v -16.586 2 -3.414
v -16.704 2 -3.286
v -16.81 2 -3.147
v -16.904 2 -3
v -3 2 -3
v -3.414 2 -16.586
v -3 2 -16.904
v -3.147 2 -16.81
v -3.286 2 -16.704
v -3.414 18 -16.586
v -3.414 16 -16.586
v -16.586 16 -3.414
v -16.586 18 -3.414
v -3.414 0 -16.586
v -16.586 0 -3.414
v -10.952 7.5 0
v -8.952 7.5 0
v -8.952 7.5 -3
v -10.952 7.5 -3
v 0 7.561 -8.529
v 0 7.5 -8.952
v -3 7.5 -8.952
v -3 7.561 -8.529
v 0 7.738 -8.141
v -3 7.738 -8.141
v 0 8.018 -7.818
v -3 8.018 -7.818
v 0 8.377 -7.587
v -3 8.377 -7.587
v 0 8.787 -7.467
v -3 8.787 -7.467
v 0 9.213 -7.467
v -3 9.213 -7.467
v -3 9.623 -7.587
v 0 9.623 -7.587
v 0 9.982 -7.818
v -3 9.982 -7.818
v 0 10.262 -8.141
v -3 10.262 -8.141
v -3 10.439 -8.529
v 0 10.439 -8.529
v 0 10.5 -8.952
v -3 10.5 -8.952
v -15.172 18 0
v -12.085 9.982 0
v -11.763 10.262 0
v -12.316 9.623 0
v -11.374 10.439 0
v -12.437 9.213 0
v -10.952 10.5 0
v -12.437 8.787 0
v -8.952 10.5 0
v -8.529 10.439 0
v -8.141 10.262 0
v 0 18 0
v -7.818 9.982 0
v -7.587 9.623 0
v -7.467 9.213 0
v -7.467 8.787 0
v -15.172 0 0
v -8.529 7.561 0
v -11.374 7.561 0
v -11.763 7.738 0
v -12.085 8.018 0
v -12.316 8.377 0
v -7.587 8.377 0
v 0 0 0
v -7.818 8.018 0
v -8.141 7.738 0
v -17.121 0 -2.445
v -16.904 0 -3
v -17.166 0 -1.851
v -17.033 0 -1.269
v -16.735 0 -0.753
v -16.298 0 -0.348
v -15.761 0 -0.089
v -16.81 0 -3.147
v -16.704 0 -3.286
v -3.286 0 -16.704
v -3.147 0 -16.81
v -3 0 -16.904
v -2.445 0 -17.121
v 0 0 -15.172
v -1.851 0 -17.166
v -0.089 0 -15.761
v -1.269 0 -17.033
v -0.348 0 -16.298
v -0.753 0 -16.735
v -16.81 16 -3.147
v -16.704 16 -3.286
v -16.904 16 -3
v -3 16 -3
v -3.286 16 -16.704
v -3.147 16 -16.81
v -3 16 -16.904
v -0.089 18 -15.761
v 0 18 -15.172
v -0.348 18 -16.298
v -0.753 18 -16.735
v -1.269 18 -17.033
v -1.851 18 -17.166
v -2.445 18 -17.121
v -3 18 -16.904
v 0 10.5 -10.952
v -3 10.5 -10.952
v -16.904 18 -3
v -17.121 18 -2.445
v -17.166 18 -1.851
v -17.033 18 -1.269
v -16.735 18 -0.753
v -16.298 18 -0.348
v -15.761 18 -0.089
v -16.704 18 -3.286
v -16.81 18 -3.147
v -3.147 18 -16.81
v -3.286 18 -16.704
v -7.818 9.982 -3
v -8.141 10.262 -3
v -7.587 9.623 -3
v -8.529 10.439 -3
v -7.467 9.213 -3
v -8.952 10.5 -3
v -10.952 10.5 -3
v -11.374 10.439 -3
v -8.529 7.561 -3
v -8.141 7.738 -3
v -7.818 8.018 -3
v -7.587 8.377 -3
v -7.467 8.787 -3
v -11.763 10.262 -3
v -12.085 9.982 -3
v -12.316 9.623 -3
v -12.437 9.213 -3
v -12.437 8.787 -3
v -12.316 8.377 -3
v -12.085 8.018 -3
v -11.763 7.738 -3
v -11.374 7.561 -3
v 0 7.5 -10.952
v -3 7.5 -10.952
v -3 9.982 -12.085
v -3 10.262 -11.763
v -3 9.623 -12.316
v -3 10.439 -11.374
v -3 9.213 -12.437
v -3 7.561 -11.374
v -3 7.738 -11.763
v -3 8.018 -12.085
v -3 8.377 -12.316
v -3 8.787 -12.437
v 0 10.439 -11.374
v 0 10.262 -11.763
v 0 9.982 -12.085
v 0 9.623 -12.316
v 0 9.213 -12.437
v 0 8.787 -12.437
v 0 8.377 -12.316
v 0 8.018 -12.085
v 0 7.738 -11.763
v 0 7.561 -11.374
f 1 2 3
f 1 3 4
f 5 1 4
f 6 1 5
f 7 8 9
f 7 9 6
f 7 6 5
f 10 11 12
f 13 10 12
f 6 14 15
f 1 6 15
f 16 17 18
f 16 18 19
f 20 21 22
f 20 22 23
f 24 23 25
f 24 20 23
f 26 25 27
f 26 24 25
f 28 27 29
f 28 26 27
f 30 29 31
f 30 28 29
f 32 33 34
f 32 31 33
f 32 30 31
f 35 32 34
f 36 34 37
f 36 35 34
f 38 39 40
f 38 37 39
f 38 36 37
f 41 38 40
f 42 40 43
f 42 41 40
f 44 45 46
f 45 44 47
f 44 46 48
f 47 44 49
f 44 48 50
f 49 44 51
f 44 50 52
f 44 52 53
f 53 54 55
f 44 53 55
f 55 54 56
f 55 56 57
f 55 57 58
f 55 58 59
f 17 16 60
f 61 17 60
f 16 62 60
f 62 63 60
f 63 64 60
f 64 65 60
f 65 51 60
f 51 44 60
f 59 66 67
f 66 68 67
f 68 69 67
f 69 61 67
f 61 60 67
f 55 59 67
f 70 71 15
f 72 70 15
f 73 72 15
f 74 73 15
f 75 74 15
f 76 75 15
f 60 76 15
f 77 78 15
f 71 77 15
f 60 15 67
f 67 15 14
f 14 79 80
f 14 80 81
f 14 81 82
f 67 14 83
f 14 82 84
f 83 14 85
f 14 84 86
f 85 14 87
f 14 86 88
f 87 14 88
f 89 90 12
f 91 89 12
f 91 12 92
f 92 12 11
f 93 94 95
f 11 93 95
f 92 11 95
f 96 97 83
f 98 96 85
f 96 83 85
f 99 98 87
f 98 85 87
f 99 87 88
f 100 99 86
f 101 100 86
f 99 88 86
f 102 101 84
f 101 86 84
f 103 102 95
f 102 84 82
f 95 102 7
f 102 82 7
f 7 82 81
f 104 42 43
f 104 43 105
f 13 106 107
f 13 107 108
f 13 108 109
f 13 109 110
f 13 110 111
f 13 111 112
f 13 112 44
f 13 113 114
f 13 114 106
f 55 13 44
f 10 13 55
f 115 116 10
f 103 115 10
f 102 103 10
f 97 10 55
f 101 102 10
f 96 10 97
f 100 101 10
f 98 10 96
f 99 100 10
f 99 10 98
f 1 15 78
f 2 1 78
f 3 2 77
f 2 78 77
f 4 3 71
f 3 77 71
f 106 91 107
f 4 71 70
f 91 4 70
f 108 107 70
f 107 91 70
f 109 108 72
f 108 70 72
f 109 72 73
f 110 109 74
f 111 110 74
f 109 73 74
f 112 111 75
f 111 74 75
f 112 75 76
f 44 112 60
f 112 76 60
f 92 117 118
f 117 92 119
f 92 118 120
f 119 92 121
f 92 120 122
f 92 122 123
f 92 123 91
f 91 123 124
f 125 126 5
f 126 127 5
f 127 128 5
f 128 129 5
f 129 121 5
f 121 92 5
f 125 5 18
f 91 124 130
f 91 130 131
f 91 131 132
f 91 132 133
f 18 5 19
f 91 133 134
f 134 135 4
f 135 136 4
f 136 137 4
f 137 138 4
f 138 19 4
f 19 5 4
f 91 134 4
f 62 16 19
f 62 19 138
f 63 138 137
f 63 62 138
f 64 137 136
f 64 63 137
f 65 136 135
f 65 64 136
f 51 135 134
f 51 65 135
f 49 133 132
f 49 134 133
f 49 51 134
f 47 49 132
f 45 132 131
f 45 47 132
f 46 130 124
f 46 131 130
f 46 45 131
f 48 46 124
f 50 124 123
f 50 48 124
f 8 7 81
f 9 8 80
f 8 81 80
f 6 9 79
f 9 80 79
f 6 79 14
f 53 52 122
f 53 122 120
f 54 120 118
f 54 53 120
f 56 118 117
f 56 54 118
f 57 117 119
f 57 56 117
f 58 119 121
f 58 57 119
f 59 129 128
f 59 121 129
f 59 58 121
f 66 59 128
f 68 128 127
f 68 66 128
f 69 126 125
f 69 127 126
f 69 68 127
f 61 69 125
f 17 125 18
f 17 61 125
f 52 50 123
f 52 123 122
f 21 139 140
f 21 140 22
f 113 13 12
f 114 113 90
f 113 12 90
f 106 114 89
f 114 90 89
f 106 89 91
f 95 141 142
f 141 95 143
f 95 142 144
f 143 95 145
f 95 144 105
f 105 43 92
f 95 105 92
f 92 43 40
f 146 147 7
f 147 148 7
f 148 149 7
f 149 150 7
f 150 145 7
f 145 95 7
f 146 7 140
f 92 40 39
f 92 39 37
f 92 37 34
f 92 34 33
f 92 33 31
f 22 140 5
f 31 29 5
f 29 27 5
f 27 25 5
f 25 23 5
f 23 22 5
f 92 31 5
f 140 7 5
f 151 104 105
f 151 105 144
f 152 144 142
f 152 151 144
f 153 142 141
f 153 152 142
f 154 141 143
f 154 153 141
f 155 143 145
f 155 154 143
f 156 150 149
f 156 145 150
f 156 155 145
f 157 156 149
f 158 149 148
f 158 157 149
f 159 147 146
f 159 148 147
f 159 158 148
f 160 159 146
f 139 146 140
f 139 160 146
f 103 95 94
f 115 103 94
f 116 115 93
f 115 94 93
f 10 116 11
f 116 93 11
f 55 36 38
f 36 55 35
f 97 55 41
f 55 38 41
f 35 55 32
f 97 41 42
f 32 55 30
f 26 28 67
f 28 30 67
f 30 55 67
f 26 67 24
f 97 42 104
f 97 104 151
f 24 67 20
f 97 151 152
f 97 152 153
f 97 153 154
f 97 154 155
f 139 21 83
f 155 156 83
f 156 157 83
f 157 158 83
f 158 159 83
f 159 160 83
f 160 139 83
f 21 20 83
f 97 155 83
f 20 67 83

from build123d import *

# Parameters (mm, degrees)
DODANIE_WYCI_GNI_CIE1_DEPTH = 18
SKORUPA1_START              = 2
SKORUPA1_DEPTH              = 14
DODANIE_WYCI_GNI_CIE2_DEPTH = 18
WYTNIJ_WYCI_GNI_CIE1_REACH  = 32.228
WYTNIJ_WYCI_GNI_CIE2_REACH  = 32.228


# Read off the part's stored shape, not the designer's step: Skorupa1
with BuildPart() as part:
    # Szkic1 → Dodanie-wyciągnięcie1 (new body)
    with BuildSketch(Plane(origin=(0, 0, 0), x_dir=(1, 0, 0), z_dir=(0, 1, 0))):
        with BuildLine():
            Line((-15.171572875, 0), (0, 0))
            Line((0, 0), (0, 15.171572875))
            ThreePointArc((0, 15.171572875), (-1, 16.903623683), (-3, 16.903623683))
            Line((-3, 16.903623683), (-3, 3))
            Line((-3, 3), (-16.903623683, 3))
            ThreePointArc((-16.903623683, 3), (-16.903623683, 1), (-15.171572875, 0))
        make_face()
        with BuildLine():
            ThreePointArc((-16.585786438, 3.414213562), (-16.758279556, 3.217522858), (-16.903623683, 3))
            Line((-16.903623683, 3), (-3, 3))
            Line((-3, 3), (-3, 16.903623683))
            ThreePointArc((-3, 16.903623683), (-3.217522858, 16.758279556), (-3.414213562, 16.585786438))
            Line((-3.414213562, 16.585786438), (-16.585786438, 3.414213562))
        make_face()
    extrude(amount=DODANIE_WYCI_GNI_CIE1_DEPTH)

    # Skorupa1 outline → Skorupa1 (cut)
    with BuildSketch(Plane(origin=(0, 0, 0), x_dir=(1, 0, 0), z_dir=(0, 1, 0)).offset(SKORUPA1_START)):
        with BuildLine():
            Line((-3, 3), (-3, 15.171572875))
            Line((-3, 15.171572875), (0, 15.171572875))
            ThreePointArc((0, 15.171572875), (-1.234633135, 17.01933194), (-3.414213562, 16.585786438))
            Line((-3.414213562, 16.585786438), (-16.585786438, 3.414213562))
            ThreePointArc((-16.585786438, 3.414213562), (-17.01933194, 1.234633135), (-15.171572875, 0))
            Line((-15.171572875, 0), (-15.171572875, 3))
            Line((-15.171572875, 3), (-3, 3))
        make_face()
    extrude(amount=SKORUPA1_DEPTH, mode=Mode.SUBTRACT)

    # Szkic1<3> → Dodanie-wyciągnięcie2 (add)
    with BuildSketch(Plane(origin=(0, 0, 0), x_dir=(1, 0, 0), z_dir=(0, 1, 0))):
        with BuildLine():
            Line((-15.171572875, 0), (0, 0))
            Line((0, 0), (0, 15.171572875))
            ThreePointArc((0, 15.171572875), (-1, 16.903623683), (-3, 16.903623683))
            Line((-3, 16.903623683), (-3, 3))
            Line((-3, 3), (-16.903623683, 3))
            ThreePointArc((-16.903623683, 3), (-16.903623683, 1), (-15.171572875, 0))
        make_face()
    extrude(amount=DODANIE_WYCI_GNI_CIE2_DEPTH)

    # Szkic3 → Wytnij-wyciągnięcie1 (cut, up to next)
    with BuildSketch(Plane.XY, mode=Mode.PRIVATE) as wytnij_wyci_gni_cie1_sk1:
        with BuildLine():
            Line((-8.951811841, 7.5), (-10.951811841, 7.5))
            ThreePointArc((-10.951811841, 7.5), (-12.451811841, 9), (-10.951811841, 10.5))
            Line((-10.951811841, 10.5), (-8.951811841, 10.5))
            ThreePointArc((-8.951811841, 10.5), (-7.451811841, 9), (-8.951811841, 7.5))
        make_face()
    wytnij_wyci_gni_cie1_tool1 = extrude(wytnij_wyci_gni_cie1_sk1.sketch, amount=-WYTNIJ_WYCI_GNI_CIE1_REACH, mode=Mode.PRIVATE) & part.part
    add(wytnij_wyci_gni_cie1_tool1.solids().sort_by_distance((-9.951812, 9, 0))[0], mode=Mode.SUBTRACT)

    # Szkic4 → Wytnij-wyciągnięcie2 (cut, up to next)
    with BuildSketch(Plane(origin=(0, 0, 0), x_dir=(0, 0, -1), z_dir=(1, 0, 0)), mode=Mode.PRIVATE) as wytnij_wyci_gni_cie2_sk1:
        with BuildLine():
            Line((10.951811841, 7.5), (8.951811841, 7.5))
            ThreePointArc((8.951811841, 7.5), (7.451811841, 9), (8.951811841, 10.5))
            Line((8.951811841, 10.5), (10.951811841, 10.5))
            ThreePointArc((10.951811841, 10.5), (12.451811841, 9), (10.951811841, 7.5))
        make_face()
    wytnij_wyci_gni_cie2_tool1 = extrude(wytnij_wyci_gni_cie2_sk1.sketch, amount=-WYTNIJ_WYCI_GNI_CIE2_REACH, mode=Mode.PRIVATE) & part.part
    add(wytnij_wyci_gni_cie2_tool1.solids().sort_by_distance((0, 9, -9.951812))[0], mode=Mode.SUBTRACT)


solid = part.part
